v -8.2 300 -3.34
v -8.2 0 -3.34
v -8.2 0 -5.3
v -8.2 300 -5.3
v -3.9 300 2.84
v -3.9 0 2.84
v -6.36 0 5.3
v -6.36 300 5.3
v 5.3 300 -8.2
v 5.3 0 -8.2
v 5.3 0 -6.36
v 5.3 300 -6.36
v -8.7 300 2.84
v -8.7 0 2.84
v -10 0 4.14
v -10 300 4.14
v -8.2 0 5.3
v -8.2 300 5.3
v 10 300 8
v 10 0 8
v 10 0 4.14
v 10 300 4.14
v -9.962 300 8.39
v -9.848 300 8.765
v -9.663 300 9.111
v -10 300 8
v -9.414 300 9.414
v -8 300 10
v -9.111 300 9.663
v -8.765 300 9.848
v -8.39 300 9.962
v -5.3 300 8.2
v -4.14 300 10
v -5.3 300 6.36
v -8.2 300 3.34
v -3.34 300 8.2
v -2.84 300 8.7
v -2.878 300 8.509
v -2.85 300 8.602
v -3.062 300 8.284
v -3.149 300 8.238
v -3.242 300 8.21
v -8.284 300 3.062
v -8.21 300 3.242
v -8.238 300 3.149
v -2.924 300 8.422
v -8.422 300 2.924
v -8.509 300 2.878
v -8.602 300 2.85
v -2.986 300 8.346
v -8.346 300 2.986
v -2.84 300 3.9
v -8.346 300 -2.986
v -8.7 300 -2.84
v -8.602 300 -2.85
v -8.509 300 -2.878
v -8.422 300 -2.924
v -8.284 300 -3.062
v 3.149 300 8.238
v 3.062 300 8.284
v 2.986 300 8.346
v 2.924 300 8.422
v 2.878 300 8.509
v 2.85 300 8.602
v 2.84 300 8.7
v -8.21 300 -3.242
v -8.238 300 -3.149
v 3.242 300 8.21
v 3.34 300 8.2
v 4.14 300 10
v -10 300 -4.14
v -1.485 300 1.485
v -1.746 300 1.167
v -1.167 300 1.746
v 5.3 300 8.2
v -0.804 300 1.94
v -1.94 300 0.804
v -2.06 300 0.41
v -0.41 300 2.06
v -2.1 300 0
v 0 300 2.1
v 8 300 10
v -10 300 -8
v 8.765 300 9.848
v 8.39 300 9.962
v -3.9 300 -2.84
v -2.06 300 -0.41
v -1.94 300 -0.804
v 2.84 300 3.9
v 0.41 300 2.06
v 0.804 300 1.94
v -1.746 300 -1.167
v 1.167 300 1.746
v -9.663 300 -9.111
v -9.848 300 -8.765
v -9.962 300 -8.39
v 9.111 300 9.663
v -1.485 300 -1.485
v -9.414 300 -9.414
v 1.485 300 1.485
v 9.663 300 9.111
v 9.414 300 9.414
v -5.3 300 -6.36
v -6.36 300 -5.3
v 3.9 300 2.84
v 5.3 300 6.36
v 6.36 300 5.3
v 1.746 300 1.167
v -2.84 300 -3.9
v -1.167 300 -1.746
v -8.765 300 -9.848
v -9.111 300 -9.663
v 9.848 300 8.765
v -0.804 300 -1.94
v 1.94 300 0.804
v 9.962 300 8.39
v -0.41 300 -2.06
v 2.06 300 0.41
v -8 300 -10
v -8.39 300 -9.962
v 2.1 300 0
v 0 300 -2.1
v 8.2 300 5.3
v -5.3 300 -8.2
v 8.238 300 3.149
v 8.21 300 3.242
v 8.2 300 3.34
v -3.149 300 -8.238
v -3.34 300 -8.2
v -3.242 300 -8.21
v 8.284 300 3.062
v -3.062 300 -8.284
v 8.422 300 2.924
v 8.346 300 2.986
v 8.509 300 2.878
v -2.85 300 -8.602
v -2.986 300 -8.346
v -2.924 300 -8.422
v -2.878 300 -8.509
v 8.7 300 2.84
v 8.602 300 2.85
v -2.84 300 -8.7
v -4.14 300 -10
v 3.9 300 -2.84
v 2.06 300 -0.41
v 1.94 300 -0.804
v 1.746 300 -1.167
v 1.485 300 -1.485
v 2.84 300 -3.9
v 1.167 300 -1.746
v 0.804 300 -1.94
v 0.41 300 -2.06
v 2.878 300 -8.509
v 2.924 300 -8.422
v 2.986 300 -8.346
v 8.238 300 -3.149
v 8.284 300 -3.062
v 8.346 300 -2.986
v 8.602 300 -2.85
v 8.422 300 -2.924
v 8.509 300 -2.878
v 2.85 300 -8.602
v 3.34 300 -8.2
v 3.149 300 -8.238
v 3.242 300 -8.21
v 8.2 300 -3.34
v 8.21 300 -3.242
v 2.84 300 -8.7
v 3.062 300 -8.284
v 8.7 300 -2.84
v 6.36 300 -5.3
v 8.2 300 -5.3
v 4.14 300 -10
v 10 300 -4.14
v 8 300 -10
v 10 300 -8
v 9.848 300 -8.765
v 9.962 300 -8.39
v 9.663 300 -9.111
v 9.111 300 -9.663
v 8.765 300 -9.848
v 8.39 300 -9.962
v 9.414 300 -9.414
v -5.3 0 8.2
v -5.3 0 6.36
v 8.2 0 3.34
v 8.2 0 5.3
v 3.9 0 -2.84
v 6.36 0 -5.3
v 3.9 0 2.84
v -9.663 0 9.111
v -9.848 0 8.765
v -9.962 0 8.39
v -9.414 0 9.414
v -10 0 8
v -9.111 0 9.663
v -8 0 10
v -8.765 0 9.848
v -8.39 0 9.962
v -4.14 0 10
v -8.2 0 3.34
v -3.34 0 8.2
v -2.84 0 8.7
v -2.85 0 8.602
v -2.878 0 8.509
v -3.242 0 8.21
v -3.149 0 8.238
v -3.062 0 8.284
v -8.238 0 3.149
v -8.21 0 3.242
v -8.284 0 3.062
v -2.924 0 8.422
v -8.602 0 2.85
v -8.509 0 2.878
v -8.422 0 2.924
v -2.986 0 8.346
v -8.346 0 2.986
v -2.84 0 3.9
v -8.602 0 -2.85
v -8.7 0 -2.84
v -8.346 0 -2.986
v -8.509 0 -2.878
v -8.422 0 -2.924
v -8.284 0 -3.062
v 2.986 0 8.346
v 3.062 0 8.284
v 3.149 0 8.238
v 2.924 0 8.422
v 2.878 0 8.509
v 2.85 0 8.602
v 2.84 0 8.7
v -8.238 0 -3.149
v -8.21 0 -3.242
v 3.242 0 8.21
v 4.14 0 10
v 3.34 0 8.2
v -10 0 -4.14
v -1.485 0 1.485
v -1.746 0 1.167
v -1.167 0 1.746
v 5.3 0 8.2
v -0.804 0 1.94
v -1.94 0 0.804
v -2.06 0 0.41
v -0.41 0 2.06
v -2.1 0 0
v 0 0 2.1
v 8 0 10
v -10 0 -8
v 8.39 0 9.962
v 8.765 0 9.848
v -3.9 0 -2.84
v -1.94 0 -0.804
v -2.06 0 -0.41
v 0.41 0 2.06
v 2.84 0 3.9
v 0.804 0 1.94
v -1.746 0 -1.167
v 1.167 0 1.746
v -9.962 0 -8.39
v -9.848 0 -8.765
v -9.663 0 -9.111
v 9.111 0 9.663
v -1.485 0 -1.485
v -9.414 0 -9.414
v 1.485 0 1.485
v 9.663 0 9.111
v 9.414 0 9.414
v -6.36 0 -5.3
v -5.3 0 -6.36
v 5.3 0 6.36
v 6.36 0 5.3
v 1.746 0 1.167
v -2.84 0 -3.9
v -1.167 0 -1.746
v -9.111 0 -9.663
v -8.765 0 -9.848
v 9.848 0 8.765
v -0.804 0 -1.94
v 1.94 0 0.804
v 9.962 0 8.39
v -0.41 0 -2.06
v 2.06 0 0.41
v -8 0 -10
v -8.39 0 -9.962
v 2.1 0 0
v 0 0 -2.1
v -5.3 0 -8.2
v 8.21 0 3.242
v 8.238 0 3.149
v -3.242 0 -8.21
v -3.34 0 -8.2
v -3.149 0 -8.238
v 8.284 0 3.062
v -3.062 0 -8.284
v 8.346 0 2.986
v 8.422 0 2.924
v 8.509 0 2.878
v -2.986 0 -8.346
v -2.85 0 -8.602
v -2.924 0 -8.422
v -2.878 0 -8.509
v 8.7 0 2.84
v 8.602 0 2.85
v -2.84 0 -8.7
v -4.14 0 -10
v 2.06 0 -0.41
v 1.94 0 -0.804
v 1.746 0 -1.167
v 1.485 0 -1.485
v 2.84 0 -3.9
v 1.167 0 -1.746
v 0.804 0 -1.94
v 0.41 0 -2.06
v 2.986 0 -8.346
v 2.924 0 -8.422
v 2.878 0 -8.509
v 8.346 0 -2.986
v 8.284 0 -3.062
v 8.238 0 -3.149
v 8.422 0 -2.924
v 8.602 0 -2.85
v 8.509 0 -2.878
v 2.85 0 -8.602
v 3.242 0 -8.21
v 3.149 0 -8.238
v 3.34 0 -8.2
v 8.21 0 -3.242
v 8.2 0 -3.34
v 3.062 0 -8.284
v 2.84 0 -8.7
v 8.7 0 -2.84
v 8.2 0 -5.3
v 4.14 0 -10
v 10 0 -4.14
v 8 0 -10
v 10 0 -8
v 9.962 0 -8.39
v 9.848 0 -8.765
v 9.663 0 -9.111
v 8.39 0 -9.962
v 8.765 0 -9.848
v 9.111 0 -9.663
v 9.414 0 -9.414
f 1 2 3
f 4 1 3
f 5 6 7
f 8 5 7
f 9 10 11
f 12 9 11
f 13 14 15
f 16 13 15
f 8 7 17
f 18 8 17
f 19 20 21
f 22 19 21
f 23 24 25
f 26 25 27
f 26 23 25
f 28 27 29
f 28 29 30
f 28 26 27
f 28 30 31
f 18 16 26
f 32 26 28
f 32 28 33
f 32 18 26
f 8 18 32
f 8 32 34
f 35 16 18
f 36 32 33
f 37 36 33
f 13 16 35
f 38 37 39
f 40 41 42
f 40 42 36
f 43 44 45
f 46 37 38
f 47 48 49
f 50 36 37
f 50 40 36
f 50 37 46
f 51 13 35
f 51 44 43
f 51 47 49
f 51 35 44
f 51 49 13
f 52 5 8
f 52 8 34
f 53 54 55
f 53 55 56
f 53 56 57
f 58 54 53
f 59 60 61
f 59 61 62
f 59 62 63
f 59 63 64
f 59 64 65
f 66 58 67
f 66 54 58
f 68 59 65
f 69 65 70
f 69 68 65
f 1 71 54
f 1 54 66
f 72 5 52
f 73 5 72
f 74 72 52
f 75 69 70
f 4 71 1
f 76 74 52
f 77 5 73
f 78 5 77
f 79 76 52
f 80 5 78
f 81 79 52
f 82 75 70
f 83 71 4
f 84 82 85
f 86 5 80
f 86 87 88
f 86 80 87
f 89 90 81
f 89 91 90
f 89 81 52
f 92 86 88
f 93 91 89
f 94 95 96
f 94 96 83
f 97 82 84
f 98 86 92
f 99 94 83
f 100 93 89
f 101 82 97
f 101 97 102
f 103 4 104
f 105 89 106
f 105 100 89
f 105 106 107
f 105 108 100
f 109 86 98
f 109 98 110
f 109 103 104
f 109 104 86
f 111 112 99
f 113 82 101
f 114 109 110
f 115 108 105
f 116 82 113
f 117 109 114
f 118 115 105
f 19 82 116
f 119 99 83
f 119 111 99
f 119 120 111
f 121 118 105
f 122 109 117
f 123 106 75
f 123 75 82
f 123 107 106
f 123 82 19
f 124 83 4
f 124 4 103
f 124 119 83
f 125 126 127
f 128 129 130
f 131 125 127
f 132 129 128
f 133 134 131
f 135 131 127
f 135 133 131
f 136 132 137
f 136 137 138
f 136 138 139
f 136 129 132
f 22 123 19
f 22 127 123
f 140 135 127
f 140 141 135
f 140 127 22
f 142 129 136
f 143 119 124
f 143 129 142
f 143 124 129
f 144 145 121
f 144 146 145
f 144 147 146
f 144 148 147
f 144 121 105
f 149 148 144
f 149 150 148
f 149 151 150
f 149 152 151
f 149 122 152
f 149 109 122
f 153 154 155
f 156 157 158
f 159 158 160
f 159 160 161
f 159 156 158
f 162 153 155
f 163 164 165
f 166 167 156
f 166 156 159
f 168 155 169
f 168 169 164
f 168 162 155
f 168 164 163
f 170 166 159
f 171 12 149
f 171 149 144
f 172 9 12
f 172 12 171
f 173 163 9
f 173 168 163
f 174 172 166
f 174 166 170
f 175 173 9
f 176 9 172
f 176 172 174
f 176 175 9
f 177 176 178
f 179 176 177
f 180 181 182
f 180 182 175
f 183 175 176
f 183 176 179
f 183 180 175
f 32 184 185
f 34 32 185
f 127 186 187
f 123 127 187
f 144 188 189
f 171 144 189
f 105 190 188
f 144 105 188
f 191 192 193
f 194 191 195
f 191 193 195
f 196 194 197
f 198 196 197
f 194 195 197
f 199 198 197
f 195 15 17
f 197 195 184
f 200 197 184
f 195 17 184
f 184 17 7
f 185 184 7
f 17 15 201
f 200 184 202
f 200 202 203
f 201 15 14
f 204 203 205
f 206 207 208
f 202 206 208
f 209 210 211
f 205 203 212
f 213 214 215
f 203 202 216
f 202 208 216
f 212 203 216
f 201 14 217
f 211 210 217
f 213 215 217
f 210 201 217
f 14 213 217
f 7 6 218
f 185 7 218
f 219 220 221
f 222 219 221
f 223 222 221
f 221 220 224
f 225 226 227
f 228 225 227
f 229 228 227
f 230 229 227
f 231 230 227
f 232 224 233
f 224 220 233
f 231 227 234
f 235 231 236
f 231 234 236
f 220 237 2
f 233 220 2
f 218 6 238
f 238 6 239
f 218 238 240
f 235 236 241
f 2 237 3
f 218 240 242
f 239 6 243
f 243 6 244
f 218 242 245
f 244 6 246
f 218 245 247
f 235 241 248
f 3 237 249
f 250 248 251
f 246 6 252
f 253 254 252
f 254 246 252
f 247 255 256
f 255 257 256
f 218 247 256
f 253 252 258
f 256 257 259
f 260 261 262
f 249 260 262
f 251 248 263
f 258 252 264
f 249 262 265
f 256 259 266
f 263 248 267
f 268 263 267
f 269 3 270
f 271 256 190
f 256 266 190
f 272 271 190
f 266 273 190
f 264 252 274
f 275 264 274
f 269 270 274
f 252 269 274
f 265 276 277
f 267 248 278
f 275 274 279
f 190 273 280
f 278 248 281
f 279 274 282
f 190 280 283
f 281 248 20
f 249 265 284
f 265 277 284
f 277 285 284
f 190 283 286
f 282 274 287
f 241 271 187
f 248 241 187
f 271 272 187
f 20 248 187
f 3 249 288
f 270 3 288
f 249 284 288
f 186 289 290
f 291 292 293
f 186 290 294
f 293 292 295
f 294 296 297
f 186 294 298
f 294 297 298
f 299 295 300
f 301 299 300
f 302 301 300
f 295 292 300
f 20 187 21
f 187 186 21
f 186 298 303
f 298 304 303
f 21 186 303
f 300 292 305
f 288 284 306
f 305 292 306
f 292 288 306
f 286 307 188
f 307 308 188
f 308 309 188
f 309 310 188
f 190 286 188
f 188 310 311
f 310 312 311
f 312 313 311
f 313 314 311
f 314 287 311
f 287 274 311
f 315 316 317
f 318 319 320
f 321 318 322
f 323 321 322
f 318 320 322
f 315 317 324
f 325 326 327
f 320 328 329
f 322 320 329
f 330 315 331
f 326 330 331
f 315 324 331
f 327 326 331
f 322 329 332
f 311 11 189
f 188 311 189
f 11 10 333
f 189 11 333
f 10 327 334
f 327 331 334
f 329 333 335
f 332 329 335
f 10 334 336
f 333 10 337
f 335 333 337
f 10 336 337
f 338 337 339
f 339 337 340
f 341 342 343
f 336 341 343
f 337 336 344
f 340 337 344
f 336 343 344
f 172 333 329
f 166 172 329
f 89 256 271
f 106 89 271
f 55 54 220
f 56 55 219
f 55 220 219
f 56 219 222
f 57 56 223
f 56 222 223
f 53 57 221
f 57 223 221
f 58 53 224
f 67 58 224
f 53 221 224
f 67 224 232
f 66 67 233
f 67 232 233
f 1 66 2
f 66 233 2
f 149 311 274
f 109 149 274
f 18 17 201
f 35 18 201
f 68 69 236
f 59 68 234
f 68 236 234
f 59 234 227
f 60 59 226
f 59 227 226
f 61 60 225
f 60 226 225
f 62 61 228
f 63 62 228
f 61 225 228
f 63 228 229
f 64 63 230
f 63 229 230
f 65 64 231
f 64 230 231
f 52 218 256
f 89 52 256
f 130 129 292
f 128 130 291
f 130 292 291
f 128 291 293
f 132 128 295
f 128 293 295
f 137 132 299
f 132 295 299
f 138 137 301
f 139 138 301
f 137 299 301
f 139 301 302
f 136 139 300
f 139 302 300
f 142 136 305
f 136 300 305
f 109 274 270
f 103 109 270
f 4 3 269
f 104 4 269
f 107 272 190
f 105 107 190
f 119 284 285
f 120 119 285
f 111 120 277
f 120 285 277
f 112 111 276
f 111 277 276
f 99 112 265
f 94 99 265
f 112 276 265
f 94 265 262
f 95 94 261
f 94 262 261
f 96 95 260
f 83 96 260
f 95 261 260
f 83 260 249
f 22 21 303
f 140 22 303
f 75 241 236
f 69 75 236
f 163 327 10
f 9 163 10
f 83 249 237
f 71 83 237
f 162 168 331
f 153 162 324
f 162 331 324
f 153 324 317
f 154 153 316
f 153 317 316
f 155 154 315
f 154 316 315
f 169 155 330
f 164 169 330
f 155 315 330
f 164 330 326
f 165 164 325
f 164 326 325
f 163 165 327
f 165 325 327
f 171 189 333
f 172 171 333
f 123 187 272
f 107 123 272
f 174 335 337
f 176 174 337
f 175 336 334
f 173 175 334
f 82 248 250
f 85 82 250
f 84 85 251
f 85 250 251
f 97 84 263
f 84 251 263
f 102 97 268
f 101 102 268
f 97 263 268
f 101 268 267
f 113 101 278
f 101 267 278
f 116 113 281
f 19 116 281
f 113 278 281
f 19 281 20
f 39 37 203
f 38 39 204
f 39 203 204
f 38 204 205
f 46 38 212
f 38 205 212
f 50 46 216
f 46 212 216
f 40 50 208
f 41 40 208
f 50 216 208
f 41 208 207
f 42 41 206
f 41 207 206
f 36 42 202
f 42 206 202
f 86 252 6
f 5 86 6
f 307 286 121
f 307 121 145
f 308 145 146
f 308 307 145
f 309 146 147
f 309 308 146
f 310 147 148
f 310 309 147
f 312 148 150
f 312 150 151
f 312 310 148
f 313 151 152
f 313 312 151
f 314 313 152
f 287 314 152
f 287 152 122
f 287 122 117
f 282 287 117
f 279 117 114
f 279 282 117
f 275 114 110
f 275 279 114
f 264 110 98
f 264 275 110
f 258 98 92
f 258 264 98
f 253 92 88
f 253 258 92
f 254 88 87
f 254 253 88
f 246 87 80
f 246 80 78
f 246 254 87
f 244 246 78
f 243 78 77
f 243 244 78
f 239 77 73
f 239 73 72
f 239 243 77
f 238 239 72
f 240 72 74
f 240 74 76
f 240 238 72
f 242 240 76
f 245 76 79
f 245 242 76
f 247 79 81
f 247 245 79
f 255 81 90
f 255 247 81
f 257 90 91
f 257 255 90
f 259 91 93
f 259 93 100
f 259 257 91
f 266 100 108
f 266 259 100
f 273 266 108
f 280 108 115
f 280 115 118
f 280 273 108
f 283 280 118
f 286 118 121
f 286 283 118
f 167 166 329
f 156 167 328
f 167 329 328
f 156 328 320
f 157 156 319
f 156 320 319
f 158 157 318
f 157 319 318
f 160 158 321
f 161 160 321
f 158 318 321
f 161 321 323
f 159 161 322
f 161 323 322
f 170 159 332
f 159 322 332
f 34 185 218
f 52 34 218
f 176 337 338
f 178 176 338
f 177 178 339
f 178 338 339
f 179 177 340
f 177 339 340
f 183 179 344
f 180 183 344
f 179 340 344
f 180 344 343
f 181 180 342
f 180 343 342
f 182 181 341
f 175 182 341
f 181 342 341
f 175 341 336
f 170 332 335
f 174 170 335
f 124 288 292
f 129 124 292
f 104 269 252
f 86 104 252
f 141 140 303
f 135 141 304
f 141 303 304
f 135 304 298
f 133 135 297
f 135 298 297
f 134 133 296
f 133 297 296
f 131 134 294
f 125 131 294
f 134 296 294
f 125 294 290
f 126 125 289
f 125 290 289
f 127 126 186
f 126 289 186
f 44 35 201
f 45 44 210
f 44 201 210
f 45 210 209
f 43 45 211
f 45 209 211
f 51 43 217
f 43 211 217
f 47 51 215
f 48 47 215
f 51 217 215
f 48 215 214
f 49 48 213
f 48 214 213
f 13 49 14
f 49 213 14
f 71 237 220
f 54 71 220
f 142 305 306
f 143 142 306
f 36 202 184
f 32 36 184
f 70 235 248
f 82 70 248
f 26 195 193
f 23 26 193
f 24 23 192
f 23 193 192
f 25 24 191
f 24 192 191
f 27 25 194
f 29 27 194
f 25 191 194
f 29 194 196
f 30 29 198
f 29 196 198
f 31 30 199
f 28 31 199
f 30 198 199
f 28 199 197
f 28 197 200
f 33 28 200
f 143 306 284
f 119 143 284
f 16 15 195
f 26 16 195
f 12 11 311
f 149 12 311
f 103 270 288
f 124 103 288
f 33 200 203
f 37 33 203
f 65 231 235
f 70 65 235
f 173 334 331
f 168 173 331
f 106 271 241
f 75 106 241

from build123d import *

# Parameters (mm, degrees)
CROQUIS1_R              = 2.1
SALIENTE_EXTRUIR2_DEPTH = 300


with BuildPart() as part:
    # Croquis1 → Saliente-Extruir2 (new body)
    with BuildSketch(Plane(origin=(0, 0, 0), x_dir=(1, 0, 0), z_dir=(0, 1, 0))):
        with BuildLine():
            Line((3.9, -2.84), (3.9, 2.84))
            Line((3.9, 2.84), (6.36, 5.3))
            Line((6.36, 5.3), (8.2, 5.3))
            Line((8.2, 5.3), (8.2, 3.34))
            ThreePointArc((8.2, 3.34), (8.346446609, 2.986446609), (8.7, 2.84))
            Line((8.7, 2.84), (10, 4.14))
            Line((10, 4.14), (10, 8))
            ThreePointArc((10, 8), (9.414213562, 9.414213562), (8, 10))
            Line((8, 10), (4.14, 10))
            Line((4.14, 10), (2.84, 8.7))
            ThreePointArc((2.84, 8.7), (2.986446609, 8.346446609), (3.34, 8.2))
            Line((3.34, 8.2), (5.3, 8.2))
            Line((5.3, 8.2), (5.3, 6.36))
            Line((5.3, 6.36), (2.84, 3.9))
            Line((2.84, 3.9), (-2.84, 3.9))
            Line((-2.84, 3.9), (-5.3, 6.36))
            Line((-5.3, 6.36), (-5.3, 8.2))
            Line((-5.3, 8.2), (-3.34, 8.2))
            ThreePointArc((-3.34, 8.2), (-2.986446609, 8.346446609), (-2.84, 8.7))
            Line((-2.84, 8.7), (-4.14, 10))
            Line((-4.14, 10), (-8, 10))
            ThreePointArc((-8, 10), (-9.414213562, 9.414213562), (-10, 8))
            Line((-10, 8), (-10, 4.14))
            Line((-10, 4.14), (-8.7, 2.84))
            ThreePointArc((-8.7, 2.84), (-8.346446609, 2.986446609), (-8.2, 3.34))
            Line((-8.2, 3.34), (-8.2, 5.3))
            Line((-8.2, 5.3), (-6.36, 5.3))
            Line((-6.36, 5.3), (-3.9, 2.84))
            Line((-3.9, 2.84), (-3.9, -2.84))
            Line((-3.9, -2.84), (-6.36, -5.3))
            Line((-6.36, -5.3), (-8.2, -5.3))
            Line((-8.2, -5.3), (-8.2, -3.34))
            ThreePointArc((-8.2, -3.34), (-8.346446609, -2.986446609), (-8.7, -2.84))
            Line((-8.7, -2.84), (-10, -4.14))
            Line((-10, -4.14), (-10, -8))
            ThreePointArc((-10, -8), (-9.414213562, -9.414213562), (-8, -10))
            Line((-8, -10), (-4.14, -10))
            Line((-4.14, -10), (-2.84, -8.7))
            ThreePointArc((-2.84, -8.7), (-2.986446609, -8.346446609), (-3.34, -8.2))
            Line((-3.34, -8.2), (-5.3, -8.2))
            Line((-5.3, -8.2), (-5.3, -6.36))
            Line((-5.3, -6.36), (-2.84, -3.9))
            Line((-2.84, -3.9), (2.84, -3.9))
            Line((2.84, -3.9), (5.3, -6.36))
            Line((5.3, -6.36), (5.3, -8.2))
            Line((5.3, -8.2), (3.34, -8.2))
            ThreePointArc((3.34, -8.2), (2.986446609, -8.346446609), (2.84, -8.7))
            Line((2.84, -8.7), (4.14, -10))
            Line((4.14, -10), (8, -10))
            ThreePointArc((8, -10), (9.414213562, -9.414213562), (10, -8))
            Line((10, -8), (10, -4.14))
            Line((10, -4.14), (8.7, -2.84))
            ThreePointArc((8.7, -2.84), (8.346446609, -2.986446609), (8.2, -3.34))
            Line((8.2, -3.34), (8.2, -5.3))
            Line((8.2, -5.3), (6.36, -5.3))
            Line((6.36, -5.3), (3.9, -2.84))
        make_face()
        Circle(CROQUIS1_R, mode=Mode.SUBTRACT)
    extrude(amount=SALIENTE_EXTRUIR2_DEPTH)


solid = part.part
